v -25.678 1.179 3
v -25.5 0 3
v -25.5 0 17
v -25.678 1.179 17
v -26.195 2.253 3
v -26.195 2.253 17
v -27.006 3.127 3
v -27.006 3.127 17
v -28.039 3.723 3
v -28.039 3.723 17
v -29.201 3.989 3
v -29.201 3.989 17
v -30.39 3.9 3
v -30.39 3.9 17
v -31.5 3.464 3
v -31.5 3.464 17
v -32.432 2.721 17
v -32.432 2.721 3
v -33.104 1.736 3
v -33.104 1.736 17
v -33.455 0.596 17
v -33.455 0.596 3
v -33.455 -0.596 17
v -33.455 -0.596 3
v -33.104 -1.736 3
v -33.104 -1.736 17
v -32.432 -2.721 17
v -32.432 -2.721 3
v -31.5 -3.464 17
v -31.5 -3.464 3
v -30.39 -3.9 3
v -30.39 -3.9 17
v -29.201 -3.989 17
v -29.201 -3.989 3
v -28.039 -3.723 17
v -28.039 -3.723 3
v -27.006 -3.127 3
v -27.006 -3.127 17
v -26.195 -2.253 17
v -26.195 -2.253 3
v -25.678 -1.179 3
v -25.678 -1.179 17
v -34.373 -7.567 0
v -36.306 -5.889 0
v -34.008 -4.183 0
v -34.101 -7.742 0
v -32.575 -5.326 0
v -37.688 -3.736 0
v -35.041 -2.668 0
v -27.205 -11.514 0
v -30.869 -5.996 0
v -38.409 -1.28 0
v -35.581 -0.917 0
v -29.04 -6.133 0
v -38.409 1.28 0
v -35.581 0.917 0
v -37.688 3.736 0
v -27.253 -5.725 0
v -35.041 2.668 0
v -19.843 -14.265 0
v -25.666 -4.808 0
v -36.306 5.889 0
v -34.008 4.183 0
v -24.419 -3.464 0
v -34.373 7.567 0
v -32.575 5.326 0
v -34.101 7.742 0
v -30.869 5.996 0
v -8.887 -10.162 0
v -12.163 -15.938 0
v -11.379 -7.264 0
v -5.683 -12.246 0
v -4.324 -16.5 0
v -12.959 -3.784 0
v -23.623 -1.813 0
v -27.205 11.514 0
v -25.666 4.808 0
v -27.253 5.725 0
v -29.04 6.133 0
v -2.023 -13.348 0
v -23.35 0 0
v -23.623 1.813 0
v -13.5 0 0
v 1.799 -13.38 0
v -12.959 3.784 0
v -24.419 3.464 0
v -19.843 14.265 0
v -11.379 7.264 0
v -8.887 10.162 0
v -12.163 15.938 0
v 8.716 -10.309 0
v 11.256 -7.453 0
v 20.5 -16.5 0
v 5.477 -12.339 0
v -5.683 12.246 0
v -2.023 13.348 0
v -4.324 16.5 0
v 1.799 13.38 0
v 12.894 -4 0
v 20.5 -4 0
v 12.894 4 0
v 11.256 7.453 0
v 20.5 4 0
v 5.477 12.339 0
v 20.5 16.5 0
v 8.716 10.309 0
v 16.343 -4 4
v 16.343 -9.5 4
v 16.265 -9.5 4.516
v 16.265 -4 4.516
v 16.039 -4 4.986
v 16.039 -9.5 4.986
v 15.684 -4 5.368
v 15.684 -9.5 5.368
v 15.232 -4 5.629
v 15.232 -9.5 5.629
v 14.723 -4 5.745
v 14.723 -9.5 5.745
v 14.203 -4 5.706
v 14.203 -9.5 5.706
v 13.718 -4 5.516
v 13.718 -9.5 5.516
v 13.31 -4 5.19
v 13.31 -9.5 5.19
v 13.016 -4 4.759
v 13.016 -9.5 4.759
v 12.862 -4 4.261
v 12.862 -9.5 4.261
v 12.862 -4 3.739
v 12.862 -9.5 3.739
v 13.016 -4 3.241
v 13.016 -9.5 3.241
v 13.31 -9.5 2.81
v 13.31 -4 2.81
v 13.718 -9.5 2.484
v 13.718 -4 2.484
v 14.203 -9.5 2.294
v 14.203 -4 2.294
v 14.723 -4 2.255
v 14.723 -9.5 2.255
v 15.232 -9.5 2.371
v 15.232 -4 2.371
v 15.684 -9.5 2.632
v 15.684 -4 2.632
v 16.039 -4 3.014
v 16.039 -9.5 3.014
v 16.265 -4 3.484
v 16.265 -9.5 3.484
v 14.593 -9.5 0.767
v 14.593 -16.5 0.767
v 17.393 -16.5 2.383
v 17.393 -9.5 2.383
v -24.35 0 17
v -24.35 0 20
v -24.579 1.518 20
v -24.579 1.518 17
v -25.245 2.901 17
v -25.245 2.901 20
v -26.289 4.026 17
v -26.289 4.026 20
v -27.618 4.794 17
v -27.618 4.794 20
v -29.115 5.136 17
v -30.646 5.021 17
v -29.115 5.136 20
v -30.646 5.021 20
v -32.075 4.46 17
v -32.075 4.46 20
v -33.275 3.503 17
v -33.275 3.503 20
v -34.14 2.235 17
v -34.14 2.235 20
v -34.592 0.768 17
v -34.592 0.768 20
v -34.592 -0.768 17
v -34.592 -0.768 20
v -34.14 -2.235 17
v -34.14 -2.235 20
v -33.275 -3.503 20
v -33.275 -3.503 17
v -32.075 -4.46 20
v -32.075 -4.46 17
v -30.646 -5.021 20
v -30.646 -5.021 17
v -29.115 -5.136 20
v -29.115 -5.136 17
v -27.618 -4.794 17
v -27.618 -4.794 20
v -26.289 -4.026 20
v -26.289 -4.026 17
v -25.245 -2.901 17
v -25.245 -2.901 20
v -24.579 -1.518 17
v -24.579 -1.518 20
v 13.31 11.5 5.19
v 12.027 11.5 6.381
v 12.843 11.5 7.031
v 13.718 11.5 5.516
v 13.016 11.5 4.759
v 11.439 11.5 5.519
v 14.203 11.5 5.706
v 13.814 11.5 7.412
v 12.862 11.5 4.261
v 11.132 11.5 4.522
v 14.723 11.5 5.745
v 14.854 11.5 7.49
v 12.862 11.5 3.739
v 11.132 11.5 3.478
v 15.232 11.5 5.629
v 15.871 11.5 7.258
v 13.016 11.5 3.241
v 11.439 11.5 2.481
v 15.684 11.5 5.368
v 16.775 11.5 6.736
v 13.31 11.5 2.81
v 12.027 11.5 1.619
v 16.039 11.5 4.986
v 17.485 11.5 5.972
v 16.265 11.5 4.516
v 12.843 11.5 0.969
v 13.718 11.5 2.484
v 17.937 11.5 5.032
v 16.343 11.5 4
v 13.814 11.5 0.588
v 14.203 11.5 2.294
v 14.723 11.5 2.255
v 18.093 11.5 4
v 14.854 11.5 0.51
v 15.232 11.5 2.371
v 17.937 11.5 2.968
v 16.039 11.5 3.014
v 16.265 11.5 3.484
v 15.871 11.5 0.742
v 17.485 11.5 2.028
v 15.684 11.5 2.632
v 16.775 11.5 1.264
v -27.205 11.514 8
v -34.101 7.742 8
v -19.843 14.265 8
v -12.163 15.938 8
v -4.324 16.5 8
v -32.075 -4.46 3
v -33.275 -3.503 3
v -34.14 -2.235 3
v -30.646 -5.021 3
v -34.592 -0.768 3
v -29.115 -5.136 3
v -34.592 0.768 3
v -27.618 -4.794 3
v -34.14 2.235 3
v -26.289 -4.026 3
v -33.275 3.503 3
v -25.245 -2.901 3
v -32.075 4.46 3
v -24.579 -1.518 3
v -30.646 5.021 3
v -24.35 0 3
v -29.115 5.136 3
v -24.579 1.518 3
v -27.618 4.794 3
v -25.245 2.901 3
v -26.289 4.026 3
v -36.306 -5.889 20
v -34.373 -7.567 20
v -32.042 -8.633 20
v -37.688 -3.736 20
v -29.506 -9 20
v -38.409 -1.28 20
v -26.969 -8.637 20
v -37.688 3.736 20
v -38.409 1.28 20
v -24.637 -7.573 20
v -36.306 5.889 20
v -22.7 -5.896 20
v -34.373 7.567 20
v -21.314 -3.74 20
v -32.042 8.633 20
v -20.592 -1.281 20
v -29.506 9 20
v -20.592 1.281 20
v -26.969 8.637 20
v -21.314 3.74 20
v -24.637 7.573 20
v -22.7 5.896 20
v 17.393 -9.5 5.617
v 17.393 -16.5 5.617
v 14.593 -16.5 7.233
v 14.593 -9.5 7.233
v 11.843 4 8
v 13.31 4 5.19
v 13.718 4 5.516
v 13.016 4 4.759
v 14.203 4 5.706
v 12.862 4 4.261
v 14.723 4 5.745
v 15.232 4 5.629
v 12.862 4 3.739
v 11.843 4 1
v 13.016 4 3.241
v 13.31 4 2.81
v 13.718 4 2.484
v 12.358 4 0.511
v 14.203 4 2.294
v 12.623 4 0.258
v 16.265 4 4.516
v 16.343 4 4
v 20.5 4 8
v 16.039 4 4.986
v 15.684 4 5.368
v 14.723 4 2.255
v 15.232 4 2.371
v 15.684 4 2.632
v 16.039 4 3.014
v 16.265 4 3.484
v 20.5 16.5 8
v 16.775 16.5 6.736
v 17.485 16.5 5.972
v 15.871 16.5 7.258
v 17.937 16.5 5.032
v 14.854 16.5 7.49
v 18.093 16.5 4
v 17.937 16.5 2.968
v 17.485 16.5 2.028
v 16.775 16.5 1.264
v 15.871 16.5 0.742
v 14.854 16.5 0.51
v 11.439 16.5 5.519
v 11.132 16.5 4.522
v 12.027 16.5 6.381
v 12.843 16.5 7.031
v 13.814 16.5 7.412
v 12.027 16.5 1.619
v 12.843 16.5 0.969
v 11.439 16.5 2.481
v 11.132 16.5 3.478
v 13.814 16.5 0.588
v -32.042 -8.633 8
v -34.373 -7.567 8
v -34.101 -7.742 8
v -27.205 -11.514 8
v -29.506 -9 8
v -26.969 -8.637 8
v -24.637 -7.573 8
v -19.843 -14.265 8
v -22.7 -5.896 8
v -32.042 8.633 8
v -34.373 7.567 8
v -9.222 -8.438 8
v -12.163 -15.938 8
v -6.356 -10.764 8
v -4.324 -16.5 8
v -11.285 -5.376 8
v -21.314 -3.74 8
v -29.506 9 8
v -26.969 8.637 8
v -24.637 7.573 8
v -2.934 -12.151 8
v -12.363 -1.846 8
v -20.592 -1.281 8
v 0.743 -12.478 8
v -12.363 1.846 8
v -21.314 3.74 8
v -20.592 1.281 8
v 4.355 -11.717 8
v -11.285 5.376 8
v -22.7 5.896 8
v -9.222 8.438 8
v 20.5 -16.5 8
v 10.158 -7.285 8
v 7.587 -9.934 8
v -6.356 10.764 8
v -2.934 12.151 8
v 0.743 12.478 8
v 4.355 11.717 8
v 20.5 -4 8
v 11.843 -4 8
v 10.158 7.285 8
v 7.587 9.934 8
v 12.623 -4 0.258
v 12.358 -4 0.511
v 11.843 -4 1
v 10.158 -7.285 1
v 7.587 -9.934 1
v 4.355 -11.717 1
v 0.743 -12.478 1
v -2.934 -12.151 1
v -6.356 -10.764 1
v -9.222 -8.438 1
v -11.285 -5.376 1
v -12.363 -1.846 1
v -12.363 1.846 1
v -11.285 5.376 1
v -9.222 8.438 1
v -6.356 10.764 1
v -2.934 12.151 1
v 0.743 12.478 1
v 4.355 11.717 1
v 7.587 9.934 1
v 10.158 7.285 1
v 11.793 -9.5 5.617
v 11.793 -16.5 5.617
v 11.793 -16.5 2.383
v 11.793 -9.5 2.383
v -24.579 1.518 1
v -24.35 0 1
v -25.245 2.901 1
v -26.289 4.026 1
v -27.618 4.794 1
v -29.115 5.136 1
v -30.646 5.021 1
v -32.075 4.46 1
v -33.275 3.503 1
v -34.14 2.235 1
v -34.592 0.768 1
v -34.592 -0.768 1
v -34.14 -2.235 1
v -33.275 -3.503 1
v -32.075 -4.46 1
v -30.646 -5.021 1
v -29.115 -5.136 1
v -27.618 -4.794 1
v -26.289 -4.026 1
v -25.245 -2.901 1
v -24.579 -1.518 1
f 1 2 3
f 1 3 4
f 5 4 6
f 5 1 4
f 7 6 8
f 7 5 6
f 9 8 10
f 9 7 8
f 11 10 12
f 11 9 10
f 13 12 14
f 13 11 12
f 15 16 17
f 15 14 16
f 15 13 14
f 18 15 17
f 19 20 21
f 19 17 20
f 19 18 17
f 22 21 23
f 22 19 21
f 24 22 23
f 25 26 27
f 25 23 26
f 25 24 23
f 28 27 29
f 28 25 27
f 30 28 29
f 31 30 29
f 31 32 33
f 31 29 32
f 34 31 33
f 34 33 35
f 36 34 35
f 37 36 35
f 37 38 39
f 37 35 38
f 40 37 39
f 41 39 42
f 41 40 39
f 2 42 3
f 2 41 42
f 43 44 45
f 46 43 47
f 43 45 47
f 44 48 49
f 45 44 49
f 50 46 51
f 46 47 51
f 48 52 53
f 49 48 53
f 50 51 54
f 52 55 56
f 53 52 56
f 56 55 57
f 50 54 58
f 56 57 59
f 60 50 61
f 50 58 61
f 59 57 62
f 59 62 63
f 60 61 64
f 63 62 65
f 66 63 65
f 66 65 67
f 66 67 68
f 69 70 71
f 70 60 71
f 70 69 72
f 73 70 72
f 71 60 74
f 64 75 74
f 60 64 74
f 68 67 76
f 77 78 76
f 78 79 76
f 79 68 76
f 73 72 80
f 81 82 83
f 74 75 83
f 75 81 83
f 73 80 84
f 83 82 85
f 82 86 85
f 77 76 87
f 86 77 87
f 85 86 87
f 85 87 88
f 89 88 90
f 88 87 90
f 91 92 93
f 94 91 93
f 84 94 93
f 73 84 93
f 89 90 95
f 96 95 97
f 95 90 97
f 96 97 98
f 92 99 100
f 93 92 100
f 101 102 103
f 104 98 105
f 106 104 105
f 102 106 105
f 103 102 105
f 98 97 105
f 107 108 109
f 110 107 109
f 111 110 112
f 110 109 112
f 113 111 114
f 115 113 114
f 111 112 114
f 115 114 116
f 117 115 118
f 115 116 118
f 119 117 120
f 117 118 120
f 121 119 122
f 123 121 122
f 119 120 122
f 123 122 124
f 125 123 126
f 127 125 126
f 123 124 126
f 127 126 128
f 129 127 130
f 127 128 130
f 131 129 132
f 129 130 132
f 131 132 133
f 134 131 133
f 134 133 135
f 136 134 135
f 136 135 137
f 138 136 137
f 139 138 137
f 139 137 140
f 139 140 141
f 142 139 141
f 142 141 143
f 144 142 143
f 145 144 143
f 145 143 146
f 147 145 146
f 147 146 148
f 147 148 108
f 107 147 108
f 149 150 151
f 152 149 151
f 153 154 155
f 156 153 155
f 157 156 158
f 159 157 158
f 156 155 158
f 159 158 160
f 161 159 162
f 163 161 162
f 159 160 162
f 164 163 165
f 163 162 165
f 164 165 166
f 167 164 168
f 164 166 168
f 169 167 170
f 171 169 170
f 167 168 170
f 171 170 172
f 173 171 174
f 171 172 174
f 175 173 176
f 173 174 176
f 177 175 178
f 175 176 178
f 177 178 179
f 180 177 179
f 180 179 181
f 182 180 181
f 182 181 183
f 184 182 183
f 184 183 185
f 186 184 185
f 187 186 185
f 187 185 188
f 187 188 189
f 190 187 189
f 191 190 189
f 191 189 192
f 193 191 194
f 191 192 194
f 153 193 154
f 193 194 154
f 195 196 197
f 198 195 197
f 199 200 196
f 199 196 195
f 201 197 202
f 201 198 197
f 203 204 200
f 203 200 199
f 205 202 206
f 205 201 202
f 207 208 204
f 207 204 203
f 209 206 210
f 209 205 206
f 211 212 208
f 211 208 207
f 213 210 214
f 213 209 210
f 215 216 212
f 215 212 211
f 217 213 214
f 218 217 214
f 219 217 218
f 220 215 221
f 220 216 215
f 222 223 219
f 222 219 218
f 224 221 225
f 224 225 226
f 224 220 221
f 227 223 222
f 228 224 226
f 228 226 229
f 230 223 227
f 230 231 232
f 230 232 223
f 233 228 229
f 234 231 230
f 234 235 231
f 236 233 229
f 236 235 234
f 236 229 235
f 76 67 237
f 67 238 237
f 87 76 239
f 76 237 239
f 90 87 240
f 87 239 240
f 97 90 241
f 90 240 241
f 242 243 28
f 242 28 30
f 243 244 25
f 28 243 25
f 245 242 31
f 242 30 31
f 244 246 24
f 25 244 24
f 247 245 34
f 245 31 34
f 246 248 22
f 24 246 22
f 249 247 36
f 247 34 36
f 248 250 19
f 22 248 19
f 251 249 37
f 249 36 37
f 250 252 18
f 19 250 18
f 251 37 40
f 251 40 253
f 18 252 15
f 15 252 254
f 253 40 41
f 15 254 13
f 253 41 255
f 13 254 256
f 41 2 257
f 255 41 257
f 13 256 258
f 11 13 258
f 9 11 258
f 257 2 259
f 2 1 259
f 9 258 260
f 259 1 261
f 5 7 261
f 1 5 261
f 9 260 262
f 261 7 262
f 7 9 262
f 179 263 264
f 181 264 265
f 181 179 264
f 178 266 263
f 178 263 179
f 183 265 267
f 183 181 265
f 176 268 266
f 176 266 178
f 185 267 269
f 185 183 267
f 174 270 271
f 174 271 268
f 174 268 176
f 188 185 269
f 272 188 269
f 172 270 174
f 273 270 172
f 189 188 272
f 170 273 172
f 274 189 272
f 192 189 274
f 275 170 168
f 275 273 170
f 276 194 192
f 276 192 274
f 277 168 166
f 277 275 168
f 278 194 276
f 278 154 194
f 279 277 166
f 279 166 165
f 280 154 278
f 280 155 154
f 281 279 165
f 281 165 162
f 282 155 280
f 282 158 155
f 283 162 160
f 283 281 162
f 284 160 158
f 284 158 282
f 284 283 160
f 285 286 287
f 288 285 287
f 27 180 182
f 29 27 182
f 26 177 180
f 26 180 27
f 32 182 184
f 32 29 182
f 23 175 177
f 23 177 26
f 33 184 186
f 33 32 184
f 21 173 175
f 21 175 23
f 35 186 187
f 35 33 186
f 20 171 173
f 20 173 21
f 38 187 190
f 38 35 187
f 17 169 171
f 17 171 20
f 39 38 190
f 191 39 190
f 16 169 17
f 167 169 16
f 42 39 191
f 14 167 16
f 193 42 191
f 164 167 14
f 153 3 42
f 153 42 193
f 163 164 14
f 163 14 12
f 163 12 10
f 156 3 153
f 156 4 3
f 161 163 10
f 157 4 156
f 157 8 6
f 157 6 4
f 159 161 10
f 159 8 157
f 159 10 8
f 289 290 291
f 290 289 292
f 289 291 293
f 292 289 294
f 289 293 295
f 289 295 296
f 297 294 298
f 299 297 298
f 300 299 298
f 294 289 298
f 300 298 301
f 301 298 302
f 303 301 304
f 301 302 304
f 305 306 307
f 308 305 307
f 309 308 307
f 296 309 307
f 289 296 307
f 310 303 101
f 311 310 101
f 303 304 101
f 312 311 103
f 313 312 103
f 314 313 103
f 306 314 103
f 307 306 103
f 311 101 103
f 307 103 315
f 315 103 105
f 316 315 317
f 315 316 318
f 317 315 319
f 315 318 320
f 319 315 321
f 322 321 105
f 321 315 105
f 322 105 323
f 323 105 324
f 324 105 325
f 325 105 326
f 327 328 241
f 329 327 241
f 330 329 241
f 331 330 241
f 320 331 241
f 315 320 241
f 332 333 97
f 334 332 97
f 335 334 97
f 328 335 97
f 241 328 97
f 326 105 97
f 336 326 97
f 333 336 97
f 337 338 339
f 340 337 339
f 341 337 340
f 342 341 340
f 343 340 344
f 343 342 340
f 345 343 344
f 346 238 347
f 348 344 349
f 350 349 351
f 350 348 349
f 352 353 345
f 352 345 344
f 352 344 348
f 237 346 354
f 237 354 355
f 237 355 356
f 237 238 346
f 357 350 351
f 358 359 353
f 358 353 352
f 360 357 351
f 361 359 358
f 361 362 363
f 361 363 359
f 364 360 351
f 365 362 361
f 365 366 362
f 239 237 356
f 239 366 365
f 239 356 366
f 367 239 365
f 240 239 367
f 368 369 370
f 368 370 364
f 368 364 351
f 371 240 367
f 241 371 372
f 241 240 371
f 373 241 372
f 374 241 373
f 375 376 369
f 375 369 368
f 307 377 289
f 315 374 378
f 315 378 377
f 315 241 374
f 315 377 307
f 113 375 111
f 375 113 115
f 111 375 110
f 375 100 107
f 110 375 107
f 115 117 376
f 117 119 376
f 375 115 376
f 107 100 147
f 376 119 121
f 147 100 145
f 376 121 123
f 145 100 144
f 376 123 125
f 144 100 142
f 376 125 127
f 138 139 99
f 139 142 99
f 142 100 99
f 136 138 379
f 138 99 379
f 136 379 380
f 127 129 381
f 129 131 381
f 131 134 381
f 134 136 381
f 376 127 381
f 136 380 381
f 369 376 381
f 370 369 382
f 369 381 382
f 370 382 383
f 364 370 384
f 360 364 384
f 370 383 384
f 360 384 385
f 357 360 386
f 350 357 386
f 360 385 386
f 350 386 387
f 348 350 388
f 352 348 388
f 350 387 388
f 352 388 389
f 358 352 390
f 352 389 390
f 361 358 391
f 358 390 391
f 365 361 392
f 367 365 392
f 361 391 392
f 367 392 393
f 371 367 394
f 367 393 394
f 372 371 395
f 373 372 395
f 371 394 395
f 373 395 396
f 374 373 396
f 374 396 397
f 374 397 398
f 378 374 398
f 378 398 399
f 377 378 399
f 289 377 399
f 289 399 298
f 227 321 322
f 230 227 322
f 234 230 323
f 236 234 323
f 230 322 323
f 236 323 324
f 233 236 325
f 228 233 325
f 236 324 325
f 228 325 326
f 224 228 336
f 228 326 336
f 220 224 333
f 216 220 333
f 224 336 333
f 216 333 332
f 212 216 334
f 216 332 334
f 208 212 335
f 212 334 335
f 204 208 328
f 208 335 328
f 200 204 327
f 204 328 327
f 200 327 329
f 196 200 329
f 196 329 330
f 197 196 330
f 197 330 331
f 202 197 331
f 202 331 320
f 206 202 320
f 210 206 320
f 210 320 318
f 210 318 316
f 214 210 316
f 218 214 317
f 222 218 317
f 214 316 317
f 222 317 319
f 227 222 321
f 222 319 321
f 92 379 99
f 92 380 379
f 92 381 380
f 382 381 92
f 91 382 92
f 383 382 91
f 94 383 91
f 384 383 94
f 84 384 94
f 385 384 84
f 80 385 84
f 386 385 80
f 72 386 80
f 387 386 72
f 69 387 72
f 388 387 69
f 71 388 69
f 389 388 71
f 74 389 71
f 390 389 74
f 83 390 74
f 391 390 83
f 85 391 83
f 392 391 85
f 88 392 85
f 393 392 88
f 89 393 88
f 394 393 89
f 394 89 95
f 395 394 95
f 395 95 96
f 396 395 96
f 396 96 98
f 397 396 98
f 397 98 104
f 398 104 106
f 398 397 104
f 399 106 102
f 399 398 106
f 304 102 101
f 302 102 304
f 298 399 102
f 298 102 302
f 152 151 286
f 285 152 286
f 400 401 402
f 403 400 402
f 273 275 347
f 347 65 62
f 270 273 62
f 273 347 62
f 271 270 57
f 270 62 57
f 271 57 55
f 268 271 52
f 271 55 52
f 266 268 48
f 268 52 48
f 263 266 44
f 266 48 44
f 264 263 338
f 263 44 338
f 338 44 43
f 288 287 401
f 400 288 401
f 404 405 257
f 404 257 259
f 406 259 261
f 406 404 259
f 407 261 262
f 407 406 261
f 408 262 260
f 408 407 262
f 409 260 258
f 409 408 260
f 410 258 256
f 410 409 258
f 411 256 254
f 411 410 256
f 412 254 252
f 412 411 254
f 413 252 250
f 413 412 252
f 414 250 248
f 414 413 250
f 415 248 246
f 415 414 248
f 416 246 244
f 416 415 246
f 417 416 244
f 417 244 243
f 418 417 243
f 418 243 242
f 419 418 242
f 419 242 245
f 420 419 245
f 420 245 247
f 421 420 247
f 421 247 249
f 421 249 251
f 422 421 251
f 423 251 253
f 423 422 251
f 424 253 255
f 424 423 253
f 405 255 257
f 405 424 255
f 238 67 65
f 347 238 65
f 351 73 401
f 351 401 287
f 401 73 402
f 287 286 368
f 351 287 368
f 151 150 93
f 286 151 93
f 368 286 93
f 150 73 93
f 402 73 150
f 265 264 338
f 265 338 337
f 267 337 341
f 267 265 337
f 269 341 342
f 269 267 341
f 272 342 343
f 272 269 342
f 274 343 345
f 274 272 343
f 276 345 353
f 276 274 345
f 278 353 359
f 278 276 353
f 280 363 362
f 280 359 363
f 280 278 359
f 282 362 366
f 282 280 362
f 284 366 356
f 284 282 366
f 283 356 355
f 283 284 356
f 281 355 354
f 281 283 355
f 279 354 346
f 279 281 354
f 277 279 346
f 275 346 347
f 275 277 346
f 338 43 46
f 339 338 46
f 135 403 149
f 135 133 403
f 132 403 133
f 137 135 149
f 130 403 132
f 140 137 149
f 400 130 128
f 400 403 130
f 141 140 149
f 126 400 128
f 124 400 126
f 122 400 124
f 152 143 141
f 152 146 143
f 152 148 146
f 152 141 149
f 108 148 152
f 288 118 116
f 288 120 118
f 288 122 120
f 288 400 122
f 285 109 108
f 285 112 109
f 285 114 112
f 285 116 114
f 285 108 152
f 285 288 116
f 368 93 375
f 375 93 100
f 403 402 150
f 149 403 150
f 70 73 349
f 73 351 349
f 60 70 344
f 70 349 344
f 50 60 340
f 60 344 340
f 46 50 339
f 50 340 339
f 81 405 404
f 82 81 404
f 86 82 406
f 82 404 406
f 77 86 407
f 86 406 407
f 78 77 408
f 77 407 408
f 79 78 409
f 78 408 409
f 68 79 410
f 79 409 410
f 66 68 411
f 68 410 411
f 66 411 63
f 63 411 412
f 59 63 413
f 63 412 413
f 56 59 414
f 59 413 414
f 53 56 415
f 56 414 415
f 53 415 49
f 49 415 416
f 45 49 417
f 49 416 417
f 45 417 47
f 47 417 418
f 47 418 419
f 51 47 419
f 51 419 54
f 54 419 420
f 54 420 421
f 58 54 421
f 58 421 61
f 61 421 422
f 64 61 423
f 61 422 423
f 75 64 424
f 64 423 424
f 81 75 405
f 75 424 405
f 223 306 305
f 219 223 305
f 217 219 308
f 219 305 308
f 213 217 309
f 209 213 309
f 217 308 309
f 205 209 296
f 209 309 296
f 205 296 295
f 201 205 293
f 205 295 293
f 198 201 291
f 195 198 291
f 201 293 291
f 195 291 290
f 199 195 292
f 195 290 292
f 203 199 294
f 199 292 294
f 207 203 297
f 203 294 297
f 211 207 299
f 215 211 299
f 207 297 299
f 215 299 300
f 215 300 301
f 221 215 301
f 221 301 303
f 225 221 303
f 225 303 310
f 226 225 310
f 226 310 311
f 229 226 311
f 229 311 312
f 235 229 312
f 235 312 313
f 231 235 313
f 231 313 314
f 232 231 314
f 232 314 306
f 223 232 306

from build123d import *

# Parameters (mm, degrees)
ESBO_O1_R                = 4
RESSALTO_EXTRUS_O1_DEPTH = 20
ESBO_O2_OUTSIDE_W        = 75.1
ESBO_O2_OUTSIDE_H        = 49.1
ESBO_O2_OUTSIDE_R        = 9
CORTE_EXTRUS_O1_DEPTH    = 12
FILETE1_R                = 55
ESBO_O3_R                = 5.15
CORTE_EXTRUS_O2_DEPTH    = 3
CORTE_EXTRUS_O3_START    = -20
ESBO_O3_2_R              = 5.15
CORTE_EXTRUS_O3_DEPTH    = 3
ESBO_O4_R                = 1.75
CORTE_EXTRUS_O4_DEPTH    = 34
CORTE_EXTRUS_O5_DEPTH    = 7
ESBO_O6_R                = 3.5
CORTE_EXTRUS_O6_DEPTH    = 5
CHANFRO1_SIZE            = 1


with BuildPart() as part:
    # Esboço1 → Ressalto-extrusão1 (new body)
    with BuildSketch(Plane.XY):
        with BuildLine():
            Line((-20.5, 16.5), (-34.372611465, 7.566878981))
            ThreePointArc((-34.372611465, 7.566878981), (-38.5, 0), (-34.372611465, -7.566878981))
            Line((-34.372611465, -7.566878981), (-20.5, -16.5))
            Line((-20.5, -16.5), (20.5, -16.5))
            Line((20.5, -16.5), (20.5, -4))
            Line((20.5, -4), (11.842719282, -4))
            ThreePointArc((11.842719282, -4), (-12.5, 0), (11.842719282, 4))
            Line((11.842719282, 4), (20.5, 4))
            Line((20.5, 4), (20.5, 16.5))
            Line((20.5, 16.5), (-20.5, 16.5))
        make_face()
        with Locations((-29.5, 0)):
            Circle(ESBO_O1_R, mode=Mode.SUBTRACT)
    extrude(amount=RESSALTO_EXTRUS_O1_DEPTH)

    # Esboço2 outside → Corte-extrusão1 (cut)
    with BuildSketch(Plane.XY.offset(20)):
        with Locations((-9, 0)):
            Rectangle(ESBO_O2_OUTSIDE_W, ESBO_O2_OUTSIDE_H)
        with Locations((-29.5, 0)):
            Circle(ESBO_O2_OUTSIDE_R, mode=Mode.SUBTRACT)
    extrude(amount=-CORTE_EXTRUS_O1_DEPTH, mode=Mode.SUBTRACT)

    # Filete1
    filete1_edges = [part.edges().sort_by_distance(p)[0] for p in [
        (-20.5, -16.5, 4),
        (-20.5, 16.5, 4),
    ]]
    fillet(filete1_edges, radius=FILETE1_R)

    # Esboço3 → Corte-extrusão2 (cut)
    with BuildSketch(Plane.XY.offset(20)):
        with Locations((-29.5, 0)):
            Circle(ESBO_O3_R)
    extrude(amount=-CORTE_EXTRUS_O2_DEPTH, mode=Mode.SUBTRACT)

    # Esboço3<2> → Corte-extrusão3 (cut)
    with BuildSketch(Plane.XY.offset(20).offset(CORTE_EXTRUS_O3_START)):
        with Locations((-29.5, 0)):
            Circle(ESBO_O3_2_R)
    extrude(amount=CORTE_EXTRUS_O3_DEPTH, mode=Mode.SUBTRACT)

    # Esboço4 → Corte-extrusão4 (cut, through all)
    with BuildSketch(Plane.XZ.offset(16.5)):
        with Locations((14.592719282, 4)):
            Circle(ESBO_O4_R)
    extrude(amount=-CORTE_EXTRUS_O4_DEPTH, mode=Mode.SUBTRACT)

    # Esboço5 → Corte-extrusão5 (cut)
    with BuildSketch(Plane.XZ.offset(16.5)):
        Polygon((14.592719282, 7.233161507), (11.792719282, 5.616580754), (11.792719282, 2.383419246), (14.592719282, 0.766838493), (17.392719282, 2.383419246), (17.392719282, 5.616580754), align=None)
    extrude(amount=-CORTE_EXTRUS_O5_DEPTH, mode=Mode.SUBTRACT)

    # Esboço6 → Corte-extrusão6 (cut)
    with BuildSketch(Plane(origin=(0, 16.5, 0), x_dir=(1, 0, 0), z_dir=(0, 1, 0))):
        with Locations((14.592719282, -4)):
            Circle(ESBO_O6_R)
    extrude(amount=-CORTE_EXTRUS_O6_DEPTH, mode=Mode.SUBTRACT)

    # Chanfro1
    chanfro1_edges = [part.edges().sort_by_distance(p)[0] for p in [
        (-12.5, 0, 0),
        (-34.65, 0, 0),
    ]]
    chamfer(chanfro1_edges, length=CHANFRO1_SIZE)


solid = part.part
